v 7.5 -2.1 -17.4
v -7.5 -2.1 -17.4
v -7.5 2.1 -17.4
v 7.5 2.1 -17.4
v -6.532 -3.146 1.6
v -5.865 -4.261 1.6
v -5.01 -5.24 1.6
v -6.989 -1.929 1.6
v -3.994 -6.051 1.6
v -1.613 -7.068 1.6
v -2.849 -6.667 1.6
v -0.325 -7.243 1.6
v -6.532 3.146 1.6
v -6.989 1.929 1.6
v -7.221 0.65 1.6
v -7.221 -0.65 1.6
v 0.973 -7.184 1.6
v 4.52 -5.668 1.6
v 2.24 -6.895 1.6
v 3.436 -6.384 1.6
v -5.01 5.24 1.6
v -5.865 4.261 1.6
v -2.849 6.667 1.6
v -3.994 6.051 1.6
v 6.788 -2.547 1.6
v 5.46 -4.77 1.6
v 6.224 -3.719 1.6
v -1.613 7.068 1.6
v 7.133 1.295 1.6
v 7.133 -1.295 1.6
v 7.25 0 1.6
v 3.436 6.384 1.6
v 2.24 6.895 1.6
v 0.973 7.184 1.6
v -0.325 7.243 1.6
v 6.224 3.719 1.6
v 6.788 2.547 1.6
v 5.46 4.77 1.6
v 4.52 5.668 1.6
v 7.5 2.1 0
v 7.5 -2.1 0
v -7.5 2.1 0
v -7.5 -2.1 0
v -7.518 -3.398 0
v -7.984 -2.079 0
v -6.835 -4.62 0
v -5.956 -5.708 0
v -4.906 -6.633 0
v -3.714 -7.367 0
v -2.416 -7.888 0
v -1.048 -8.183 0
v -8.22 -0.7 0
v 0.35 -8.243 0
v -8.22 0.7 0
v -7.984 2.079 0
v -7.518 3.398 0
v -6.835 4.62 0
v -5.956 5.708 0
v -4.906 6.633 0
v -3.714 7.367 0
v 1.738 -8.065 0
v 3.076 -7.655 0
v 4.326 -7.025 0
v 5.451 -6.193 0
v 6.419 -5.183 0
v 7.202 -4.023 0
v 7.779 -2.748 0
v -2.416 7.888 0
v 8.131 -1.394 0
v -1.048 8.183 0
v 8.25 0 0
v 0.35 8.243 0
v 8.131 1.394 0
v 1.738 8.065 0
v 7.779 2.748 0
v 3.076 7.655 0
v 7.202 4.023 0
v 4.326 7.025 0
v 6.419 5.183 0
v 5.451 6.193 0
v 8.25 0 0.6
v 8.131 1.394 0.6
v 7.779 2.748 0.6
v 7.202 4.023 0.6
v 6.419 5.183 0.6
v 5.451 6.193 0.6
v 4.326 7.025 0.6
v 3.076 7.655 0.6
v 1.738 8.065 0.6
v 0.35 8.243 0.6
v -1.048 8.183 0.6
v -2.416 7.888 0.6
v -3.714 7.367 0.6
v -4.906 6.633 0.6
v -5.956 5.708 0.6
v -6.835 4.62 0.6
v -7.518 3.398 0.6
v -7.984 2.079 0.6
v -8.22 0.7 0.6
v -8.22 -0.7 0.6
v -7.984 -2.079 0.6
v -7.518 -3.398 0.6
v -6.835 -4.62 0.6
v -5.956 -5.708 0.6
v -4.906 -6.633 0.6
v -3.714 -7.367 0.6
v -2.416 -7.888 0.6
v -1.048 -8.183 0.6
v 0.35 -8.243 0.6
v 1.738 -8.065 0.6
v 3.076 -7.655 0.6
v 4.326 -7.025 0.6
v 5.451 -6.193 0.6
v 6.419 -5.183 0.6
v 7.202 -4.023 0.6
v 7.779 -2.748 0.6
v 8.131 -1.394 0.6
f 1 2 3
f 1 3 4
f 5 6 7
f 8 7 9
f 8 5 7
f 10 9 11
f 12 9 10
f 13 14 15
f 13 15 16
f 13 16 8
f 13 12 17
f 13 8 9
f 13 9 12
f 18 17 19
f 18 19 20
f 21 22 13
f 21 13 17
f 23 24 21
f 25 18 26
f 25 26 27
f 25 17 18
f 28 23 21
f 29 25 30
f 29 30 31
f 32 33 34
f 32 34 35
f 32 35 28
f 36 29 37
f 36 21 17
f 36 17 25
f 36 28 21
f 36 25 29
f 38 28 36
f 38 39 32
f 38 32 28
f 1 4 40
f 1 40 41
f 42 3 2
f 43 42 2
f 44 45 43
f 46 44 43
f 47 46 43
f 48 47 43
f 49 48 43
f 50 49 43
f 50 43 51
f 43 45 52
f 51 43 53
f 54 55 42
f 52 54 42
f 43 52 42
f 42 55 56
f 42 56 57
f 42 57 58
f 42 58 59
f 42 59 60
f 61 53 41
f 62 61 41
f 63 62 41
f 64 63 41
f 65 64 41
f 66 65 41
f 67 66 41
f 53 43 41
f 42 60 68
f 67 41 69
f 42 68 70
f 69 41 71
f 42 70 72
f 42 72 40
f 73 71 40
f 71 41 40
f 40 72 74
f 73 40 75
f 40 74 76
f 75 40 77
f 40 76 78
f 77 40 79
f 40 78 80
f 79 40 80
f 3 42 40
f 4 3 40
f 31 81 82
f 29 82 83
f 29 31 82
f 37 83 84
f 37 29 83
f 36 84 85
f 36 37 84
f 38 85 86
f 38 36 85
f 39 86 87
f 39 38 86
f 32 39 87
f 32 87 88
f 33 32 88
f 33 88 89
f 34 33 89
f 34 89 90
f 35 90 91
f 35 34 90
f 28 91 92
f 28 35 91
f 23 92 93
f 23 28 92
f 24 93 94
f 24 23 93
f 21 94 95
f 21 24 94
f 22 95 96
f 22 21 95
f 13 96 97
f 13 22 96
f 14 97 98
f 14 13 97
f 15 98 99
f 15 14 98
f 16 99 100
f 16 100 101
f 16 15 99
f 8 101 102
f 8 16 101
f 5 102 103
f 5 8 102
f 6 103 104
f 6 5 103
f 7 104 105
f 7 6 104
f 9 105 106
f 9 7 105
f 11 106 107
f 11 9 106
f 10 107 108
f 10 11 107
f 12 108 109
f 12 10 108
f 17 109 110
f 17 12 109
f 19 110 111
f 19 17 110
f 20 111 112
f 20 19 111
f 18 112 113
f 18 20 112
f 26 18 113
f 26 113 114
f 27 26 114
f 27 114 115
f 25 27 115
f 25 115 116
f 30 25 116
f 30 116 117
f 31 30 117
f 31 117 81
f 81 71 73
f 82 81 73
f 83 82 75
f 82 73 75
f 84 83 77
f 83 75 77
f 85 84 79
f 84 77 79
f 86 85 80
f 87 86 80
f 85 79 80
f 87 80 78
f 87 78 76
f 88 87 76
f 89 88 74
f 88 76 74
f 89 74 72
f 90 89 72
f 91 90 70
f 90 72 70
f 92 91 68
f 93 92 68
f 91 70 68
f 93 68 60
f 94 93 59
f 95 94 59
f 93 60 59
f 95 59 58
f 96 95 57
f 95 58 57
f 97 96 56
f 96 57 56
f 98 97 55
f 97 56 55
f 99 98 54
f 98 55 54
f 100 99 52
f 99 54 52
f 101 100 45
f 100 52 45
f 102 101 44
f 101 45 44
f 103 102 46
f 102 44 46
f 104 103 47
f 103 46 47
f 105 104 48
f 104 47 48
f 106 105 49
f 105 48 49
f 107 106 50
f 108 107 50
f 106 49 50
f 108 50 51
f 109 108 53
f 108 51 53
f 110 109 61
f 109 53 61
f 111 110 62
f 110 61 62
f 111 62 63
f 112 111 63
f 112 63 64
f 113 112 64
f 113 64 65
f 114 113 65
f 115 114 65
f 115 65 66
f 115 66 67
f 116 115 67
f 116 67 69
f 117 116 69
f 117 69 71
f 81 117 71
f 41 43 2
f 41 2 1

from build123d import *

# Parameters (mm, degrees)
SKETCH_R         = 8.25
EXTRUDE_DEPTH    = 1.6
CHAMFER_SIZE     = 1
SKETCH001_W      = 15
SKETCH001_H      = 4.2
EXTRUDE001_DEPTH = 17.4


with BuildPart() as chamfer_body:
    # Sketch → Extrude (new body)
    with BuildSketch(Plane.XY):
        Circle(SKETCH_R)
    extrude(amount=EXTRUDE_DEPTH)

    # Chamfer
    chamfer_edges = [chamfer_body.edges().sort_by_distance(p)[0] for p in [
        (-8.25, 0, 1.6),
    ]]
    chamfer(chamfer_edges, length=CHAMFER_SIZE)


with BuildPart() as fusion:
    # Sketch001 (on Face3 of Chamfer) → Extrude001 (new body)
    with BuildSketch(Plane(origin=(0, 0, 0), x_dir=(1, 0, 0), z_dir=(0, 0, -1))):
        Rectangle(SKETCH001_W, SKETCH001_H)
    extrude(amount=EXTRUDE001_DEPTH)

    # Fusion: union Chamfer body
    add(chamfer_body.part)


solid = fusion.part
